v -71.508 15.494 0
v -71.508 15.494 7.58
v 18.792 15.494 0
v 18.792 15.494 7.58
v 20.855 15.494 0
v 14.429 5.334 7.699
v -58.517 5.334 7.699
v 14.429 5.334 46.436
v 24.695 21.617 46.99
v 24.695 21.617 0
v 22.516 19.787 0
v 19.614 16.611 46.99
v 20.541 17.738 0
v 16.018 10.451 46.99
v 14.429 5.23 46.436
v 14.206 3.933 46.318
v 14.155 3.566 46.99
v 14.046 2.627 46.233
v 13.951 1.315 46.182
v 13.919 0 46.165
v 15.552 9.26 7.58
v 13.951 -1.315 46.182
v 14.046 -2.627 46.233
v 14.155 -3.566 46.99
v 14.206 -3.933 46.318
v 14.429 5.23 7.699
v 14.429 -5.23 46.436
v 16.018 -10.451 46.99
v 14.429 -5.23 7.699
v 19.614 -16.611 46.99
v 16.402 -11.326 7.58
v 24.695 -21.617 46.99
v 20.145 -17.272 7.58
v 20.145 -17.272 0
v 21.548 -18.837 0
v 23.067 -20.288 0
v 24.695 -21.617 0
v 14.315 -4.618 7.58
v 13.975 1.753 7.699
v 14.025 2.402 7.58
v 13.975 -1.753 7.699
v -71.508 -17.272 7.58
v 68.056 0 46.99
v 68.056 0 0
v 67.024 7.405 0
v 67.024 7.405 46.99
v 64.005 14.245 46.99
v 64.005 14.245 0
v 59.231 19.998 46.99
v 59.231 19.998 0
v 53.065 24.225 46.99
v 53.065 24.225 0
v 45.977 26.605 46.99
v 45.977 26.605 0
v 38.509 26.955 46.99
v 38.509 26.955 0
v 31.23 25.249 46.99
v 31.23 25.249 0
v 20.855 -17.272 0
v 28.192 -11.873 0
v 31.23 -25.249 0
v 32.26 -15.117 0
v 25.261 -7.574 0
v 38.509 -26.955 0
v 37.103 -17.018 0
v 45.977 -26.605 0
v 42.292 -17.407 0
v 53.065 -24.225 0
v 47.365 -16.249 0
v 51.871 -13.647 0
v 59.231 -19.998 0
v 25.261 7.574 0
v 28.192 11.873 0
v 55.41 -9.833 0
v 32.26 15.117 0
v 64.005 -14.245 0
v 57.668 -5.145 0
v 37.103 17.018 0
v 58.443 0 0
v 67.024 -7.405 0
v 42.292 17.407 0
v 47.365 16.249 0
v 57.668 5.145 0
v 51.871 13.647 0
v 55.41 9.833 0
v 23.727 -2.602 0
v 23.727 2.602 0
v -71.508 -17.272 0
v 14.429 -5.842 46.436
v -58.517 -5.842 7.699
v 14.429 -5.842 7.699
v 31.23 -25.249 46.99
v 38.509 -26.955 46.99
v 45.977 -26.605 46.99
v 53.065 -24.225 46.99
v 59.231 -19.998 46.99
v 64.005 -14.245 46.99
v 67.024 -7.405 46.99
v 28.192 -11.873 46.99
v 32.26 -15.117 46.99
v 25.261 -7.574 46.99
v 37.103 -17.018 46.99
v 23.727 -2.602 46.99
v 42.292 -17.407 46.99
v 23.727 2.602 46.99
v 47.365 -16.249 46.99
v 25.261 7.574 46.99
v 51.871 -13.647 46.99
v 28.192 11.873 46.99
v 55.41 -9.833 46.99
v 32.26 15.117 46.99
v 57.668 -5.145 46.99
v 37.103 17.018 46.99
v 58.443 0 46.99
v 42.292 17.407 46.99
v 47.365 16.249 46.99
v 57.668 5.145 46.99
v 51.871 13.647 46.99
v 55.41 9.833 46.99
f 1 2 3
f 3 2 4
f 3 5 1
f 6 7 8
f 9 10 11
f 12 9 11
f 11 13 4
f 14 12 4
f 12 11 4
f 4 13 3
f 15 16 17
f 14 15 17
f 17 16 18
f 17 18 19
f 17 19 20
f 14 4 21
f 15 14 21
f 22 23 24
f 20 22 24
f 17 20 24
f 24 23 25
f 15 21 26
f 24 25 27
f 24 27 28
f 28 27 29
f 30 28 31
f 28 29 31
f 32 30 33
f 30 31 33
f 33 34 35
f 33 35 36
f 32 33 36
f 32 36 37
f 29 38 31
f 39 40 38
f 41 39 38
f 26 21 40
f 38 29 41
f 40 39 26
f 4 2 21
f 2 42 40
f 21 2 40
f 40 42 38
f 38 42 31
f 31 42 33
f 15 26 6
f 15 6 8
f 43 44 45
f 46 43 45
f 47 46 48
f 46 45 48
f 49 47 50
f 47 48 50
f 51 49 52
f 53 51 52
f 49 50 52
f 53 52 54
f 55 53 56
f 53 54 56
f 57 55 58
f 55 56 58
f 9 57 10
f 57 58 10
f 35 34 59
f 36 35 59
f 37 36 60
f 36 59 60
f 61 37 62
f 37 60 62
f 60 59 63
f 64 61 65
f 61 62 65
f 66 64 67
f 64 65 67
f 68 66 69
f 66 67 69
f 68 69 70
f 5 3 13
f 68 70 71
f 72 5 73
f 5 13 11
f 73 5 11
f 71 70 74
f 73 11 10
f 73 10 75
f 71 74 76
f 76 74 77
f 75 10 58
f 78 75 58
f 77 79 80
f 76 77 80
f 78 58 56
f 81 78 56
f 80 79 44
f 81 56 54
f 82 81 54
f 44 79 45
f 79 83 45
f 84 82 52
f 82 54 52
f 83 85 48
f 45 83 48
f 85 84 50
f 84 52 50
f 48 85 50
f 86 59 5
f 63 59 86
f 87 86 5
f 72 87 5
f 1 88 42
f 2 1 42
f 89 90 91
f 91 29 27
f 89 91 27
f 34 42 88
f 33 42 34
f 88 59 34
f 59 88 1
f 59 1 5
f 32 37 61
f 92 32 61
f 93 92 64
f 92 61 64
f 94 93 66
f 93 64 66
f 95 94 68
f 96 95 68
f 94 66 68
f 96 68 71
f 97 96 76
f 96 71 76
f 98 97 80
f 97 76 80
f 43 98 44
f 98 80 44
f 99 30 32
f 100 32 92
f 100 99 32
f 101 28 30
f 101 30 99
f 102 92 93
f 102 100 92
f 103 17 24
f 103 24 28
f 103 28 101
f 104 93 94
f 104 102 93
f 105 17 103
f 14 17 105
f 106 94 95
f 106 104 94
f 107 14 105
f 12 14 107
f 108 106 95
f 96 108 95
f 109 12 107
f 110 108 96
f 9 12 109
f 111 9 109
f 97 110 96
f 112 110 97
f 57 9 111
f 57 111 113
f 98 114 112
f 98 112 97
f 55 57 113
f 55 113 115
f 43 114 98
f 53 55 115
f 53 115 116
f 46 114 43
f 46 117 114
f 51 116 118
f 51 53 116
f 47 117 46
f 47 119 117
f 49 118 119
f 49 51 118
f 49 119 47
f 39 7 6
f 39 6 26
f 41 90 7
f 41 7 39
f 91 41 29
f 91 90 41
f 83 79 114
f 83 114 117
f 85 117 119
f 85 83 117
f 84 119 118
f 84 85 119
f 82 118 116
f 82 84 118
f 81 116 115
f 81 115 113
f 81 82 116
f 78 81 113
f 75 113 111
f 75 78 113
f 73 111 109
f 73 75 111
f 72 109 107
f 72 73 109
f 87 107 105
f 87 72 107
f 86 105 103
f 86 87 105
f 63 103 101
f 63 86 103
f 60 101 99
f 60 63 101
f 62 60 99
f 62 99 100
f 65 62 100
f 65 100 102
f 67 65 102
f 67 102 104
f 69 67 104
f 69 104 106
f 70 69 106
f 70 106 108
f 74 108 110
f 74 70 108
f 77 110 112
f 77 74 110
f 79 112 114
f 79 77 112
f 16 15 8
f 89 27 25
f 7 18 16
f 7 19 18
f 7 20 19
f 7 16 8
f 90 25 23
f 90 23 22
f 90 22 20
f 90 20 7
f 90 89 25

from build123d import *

# Parameters (mm, degrees)
F0_R          = 17.45542
F1_DEPTH      = 46.99
F2_W          = 92.362424
F2_H          = 7.579895
F3_DEPTH      = 17.272
F3_DEPTH_BACK = 15.494
F5_DEPTH      = 5.842
F5_DEPTH_BACK = 5.334


with BuildPart() as f1:
    # F0 (on Top) → F1 (new body)
    with BuildSketch(Plane.XY):
        with BuildLine():
            ThreePointArc((68.056495, 0), (53.064586, 24.225442), (24.695165, 21.616736))
            ThreePointArc((24.695165, 21.616736), (13.918667, 0), (24.695165, -21.616736))
            ThreePointArc((24.695165, -21.616736), (53.064586, -24.225442), (68.056495, 0))
        make_face()
        with Locations((40.987581, 0)):
            Circle(F0_R, mode=Mode.SUBTRACT)
    extrude(amount=F1_DEPTH)

    # F2 (on Front) → F3 (join, two sides)
    with BuildSketch(Plane.XZ) as f3_sk:
        with Locations((-25.326473, 3.789947)):
            Rectangle(F2_W, F2_H)
    extrude(amount=F3_DEPTH)
    extrude(f3_sk.sketch, amount=-F3_DEPTH_BACK)

    # F4 (on Front) → F5 (join, two sides)
    with BuildSketch(Plane.XZ) as f5_sk:
        Polygon((14.428656, 46.435788), (-58.51711, 7.69881), (14.428656, 7.69881), align=None)
    extrude(amount=F5_DEPTH)
    extrude(f5_sk.sketch, amount=-F5_DEPTH_BACK)


solid = f1.part
